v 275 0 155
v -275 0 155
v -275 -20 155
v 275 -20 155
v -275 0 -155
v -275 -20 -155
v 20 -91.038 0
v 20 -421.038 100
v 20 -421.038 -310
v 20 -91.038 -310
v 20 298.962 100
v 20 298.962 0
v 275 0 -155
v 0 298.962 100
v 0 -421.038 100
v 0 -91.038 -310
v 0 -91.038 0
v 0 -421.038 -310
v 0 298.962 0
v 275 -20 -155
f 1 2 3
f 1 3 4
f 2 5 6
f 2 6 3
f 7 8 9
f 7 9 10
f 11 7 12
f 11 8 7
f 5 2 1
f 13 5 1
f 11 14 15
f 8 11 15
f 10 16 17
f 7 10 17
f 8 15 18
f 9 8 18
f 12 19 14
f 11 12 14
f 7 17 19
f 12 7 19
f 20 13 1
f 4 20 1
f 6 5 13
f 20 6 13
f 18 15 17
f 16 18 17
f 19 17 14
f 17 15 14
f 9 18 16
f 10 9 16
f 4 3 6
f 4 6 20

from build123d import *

# Parameters (mm, degrees)
F1_DEPTH = 20
F2_W     = 550
F2_H     = 310
F3_DEPTH = 20


with BuildPart() as f1:
    # F0 (on Right) → F1 (new body)
    with BuildSketch(Plane.YZ):
        Polygon((298.961514, 100), (-421.038486, 100), (-421.038486, -310), (-91.038486, -310), (-91.038486, 0), (298.961514, 0), align=None)
    extrude(amount=F1_DEPTH)


with BuildPart() as f3:
    # F2 (on Front) → F3 (new body)
    with BuildSketch(Plane.XZ):
        Rectangle(F2_W, F2_H)
    extrude(amount=F3_DEPTH)


solid = Compound([f1.part, f3.part])
